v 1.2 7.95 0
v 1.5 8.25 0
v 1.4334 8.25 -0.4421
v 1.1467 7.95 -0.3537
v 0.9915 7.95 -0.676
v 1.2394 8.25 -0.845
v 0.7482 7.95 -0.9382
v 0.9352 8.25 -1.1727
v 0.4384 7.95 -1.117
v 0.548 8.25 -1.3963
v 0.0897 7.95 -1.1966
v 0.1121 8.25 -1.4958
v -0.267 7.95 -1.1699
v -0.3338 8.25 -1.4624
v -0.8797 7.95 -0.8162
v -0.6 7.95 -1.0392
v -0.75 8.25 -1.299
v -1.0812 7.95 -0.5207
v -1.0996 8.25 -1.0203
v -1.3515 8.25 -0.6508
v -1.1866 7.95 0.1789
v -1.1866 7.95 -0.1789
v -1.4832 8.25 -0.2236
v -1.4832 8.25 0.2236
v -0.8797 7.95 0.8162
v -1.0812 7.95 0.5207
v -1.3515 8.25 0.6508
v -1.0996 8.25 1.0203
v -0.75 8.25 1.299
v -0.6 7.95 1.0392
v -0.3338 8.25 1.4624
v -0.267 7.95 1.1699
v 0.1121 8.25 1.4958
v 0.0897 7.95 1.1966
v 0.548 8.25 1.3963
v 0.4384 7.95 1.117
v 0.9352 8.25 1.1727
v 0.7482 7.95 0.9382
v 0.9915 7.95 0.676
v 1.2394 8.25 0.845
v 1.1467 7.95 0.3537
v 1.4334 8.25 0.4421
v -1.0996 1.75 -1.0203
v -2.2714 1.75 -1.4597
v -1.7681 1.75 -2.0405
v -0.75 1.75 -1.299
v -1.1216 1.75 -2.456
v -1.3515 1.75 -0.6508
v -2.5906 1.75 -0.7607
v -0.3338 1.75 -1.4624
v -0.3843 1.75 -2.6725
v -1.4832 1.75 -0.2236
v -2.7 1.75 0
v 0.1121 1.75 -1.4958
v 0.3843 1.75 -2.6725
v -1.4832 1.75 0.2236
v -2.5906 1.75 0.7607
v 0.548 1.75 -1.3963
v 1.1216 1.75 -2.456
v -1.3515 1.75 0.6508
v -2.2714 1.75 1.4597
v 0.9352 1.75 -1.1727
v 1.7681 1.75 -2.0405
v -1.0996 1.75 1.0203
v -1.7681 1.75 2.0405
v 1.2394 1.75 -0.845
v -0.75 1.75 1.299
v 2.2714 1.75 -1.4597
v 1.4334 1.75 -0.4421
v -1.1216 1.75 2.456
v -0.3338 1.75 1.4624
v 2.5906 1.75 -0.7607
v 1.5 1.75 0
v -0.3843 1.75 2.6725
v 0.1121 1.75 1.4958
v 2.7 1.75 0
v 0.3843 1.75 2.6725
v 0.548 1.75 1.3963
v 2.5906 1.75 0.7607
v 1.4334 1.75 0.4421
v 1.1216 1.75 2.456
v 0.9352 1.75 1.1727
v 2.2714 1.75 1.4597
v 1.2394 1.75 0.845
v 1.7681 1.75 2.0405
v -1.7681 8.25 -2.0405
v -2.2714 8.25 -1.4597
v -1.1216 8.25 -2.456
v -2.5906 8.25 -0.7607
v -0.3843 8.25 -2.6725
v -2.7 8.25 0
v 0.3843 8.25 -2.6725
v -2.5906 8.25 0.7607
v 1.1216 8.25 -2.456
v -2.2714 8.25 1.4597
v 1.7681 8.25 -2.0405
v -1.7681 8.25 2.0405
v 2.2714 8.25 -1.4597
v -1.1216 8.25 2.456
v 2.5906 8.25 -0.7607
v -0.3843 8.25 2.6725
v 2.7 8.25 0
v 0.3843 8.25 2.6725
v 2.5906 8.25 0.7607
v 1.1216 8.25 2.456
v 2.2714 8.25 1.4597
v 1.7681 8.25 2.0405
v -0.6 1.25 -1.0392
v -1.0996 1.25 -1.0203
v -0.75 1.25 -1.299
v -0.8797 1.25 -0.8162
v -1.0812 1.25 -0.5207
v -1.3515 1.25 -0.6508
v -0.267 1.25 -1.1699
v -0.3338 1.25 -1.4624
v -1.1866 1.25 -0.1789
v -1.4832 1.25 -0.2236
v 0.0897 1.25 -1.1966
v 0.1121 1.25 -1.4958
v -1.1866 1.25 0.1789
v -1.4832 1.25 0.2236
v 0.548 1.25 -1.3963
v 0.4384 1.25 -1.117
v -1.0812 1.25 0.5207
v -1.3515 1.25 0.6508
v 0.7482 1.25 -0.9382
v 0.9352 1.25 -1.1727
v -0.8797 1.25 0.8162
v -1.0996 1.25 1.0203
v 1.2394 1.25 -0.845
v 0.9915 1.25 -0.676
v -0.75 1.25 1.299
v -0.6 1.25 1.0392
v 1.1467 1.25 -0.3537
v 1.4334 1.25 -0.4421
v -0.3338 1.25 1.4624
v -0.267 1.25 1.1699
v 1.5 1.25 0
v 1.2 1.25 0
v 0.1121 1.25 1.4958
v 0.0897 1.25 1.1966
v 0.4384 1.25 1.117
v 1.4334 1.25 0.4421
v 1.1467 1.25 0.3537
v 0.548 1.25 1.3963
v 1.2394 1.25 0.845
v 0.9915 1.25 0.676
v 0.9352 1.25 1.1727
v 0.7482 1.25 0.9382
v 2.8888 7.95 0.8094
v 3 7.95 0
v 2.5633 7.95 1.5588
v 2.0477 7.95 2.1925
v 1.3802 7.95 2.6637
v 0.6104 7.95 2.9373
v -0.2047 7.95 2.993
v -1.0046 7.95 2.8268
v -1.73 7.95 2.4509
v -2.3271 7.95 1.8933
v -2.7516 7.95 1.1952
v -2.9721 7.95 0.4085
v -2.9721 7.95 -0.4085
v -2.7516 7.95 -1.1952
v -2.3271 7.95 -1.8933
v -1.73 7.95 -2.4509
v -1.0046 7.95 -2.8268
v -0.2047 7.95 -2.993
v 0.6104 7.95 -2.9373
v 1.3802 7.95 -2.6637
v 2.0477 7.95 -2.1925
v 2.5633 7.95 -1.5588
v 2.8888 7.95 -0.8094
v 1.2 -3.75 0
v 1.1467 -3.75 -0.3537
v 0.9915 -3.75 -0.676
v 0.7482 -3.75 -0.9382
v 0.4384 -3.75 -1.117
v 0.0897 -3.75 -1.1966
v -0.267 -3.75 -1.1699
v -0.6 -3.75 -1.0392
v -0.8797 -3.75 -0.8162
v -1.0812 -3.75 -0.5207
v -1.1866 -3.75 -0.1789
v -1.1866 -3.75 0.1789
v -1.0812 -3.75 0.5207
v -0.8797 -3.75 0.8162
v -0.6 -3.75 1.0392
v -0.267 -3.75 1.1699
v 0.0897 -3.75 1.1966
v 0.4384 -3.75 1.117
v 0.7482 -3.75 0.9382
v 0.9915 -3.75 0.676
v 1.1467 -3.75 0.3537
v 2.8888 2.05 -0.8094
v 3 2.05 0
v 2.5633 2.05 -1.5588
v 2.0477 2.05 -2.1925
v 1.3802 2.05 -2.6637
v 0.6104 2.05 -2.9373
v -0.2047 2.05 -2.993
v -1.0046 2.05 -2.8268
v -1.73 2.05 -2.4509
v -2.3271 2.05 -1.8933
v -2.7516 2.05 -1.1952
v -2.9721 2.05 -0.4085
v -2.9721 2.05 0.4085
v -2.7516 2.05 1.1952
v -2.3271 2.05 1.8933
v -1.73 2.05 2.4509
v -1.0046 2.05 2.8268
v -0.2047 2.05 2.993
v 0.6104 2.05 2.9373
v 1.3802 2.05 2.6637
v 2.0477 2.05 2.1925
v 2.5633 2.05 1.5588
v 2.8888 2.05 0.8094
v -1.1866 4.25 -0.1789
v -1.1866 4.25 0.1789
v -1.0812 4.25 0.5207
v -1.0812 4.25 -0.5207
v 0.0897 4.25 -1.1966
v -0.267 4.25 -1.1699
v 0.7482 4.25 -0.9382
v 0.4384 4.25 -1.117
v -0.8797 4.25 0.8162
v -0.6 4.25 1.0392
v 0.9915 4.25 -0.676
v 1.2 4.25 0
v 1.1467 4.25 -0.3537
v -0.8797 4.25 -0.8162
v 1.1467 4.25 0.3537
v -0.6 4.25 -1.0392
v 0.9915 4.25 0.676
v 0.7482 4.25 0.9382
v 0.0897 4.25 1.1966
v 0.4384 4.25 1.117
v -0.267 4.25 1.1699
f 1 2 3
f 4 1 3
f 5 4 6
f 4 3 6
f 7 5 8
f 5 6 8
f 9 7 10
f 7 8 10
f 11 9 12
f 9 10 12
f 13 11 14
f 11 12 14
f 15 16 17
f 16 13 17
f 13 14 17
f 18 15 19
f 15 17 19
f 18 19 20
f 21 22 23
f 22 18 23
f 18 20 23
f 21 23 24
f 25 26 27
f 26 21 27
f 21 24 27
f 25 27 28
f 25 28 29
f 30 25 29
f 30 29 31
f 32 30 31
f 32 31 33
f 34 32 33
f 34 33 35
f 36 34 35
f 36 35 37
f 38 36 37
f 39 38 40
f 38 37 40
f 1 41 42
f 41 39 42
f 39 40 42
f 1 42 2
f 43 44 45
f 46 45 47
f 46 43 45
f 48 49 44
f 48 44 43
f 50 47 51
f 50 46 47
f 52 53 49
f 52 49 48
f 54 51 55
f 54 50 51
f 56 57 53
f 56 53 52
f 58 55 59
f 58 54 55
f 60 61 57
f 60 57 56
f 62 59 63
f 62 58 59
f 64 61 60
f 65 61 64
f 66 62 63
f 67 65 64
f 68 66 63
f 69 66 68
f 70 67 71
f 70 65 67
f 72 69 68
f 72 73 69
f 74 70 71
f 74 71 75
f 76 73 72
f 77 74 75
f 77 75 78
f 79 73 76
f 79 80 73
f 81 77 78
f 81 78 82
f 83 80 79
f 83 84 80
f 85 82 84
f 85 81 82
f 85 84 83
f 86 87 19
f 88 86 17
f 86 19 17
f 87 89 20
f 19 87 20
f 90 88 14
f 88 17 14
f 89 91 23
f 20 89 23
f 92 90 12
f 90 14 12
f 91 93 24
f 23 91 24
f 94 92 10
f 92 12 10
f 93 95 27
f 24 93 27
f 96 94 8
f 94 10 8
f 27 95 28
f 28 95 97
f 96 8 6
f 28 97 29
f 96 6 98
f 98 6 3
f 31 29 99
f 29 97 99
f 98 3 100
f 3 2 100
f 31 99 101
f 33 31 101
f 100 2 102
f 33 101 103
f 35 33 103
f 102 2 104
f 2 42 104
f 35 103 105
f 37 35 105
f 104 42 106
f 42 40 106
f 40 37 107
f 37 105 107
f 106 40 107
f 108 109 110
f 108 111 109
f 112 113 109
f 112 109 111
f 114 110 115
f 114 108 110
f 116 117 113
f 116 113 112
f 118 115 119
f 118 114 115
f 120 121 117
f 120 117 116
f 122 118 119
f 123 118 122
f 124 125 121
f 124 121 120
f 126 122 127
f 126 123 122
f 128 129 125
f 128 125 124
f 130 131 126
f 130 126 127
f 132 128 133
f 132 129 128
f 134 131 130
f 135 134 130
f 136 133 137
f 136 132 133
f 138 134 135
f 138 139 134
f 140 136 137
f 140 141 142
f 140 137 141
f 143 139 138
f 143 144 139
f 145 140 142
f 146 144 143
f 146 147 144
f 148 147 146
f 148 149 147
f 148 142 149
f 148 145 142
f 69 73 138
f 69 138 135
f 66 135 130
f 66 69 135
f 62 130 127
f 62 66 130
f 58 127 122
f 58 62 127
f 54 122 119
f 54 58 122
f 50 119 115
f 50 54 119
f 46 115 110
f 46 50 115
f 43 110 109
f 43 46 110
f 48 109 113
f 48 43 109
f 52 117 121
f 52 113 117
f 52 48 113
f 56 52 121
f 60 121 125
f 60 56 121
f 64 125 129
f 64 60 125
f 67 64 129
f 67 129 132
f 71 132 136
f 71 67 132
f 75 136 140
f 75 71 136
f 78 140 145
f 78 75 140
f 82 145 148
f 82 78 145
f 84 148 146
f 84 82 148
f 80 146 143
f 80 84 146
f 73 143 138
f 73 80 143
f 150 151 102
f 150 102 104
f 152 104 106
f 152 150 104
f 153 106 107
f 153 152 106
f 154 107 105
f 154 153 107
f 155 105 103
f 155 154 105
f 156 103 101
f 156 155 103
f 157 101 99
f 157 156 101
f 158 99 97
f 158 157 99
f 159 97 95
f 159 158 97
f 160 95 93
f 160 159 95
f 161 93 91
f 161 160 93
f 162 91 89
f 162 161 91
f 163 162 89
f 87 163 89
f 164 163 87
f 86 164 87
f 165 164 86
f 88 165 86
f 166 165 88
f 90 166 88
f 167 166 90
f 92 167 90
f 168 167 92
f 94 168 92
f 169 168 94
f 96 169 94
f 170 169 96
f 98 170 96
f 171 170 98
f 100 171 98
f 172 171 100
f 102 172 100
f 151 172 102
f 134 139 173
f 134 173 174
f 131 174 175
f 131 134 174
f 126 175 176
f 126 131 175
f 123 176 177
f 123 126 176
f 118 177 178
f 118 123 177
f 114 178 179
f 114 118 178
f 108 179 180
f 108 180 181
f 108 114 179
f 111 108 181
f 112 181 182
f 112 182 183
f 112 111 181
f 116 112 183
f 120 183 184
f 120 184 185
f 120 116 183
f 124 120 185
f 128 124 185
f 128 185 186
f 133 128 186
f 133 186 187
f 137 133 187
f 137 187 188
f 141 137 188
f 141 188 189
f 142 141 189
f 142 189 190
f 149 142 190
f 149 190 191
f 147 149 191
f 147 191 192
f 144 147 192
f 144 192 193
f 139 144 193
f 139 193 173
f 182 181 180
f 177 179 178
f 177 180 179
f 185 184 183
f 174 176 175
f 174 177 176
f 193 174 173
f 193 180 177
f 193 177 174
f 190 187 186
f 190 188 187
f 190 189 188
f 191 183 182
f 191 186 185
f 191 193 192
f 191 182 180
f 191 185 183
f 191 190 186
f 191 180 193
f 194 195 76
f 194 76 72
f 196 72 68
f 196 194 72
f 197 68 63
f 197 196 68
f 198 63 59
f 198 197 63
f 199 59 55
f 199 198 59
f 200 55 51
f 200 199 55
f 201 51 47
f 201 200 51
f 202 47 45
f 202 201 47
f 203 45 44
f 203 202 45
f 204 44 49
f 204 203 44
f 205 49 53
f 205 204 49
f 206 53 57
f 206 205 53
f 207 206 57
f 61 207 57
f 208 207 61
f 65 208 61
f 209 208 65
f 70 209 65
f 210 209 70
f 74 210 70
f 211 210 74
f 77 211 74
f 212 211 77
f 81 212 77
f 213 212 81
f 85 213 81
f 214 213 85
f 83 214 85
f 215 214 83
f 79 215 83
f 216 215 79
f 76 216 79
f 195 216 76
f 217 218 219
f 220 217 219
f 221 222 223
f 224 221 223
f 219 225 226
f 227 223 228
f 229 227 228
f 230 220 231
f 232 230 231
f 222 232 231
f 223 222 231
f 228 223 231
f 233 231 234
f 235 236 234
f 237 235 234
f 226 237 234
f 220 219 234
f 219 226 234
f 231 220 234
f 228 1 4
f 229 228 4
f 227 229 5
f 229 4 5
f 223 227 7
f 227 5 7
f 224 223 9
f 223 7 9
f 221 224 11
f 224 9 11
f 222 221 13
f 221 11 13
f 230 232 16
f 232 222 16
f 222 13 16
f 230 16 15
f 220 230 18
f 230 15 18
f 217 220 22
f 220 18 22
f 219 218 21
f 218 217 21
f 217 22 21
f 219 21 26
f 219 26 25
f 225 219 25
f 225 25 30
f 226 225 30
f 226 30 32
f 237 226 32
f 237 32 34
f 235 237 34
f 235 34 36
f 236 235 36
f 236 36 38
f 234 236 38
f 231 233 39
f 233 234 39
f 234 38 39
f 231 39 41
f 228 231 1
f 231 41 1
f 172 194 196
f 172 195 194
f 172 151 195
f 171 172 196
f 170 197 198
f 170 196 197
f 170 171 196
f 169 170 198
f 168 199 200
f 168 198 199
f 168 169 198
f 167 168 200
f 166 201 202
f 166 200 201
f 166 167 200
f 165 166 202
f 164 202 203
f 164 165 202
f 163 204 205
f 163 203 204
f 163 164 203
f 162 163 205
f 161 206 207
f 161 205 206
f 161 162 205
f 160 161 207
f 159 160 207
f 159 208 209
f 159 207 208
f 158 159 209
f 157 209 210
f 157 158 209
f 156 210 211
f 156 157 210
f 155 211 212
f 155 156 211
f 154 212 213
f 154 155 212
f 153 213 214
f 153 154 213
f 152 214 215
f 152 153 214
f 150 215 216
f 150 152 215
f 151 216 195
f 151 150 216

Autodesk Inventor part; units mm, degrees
ref_plane "YZ Plane" through (0, 0, 0) normal (1, 0, 0) x (0, 1, 0)
ref_plane "XZ Plane" through (0, 0, 0) normal (0, 1, 0) x (-1, 0, 0)
ref_plane "XY Plane" through (0, 0, 0) normal (0, 0, 1) x (1, 0, 0)
sketch "スケッチ1" plane through (0, 0, 0) normal (0, 0, 1) x (1, 0, 0)
  line L0 (0, -4.25) -> (0.9, -4.25)
  line L1 (0.9, -4.25) -> (1.2, -3.95)
  line L2 (1.2, -3.95) -> (1.2, 1.25)
  line L3 (1.2, 1.25) -> (1.5, 1.25)
  line L4 (1.5, 1.25) -> (1.5, 1.75)
  line L5 (1.5, 1.75) -> (2.7, 1.75)
  line L6 (3, 7.95) -> (2.7, 8.25)
  line L7 (2.7, 8.25) -> (1.5, 8.25)
  line L8 (1.5, 8.25) -> (1.2, 7.95)
  line L9 (0, 7.4044) -> (0, -7.4044) construction
  line L10 (0, -4.25) -> (0, 4.25)
  line L11 (0, 4.25) -> (1.2, 4.25)
  line L12 (1.2, 4.25) -> (1.2, 7.95)
  line L13 (2.7, 1.75) -> (3, 2.05)
  line L14 (3, 2.05) -> (3, 7.95)
  point P0 (0, 0)
  point P1 (0, 0)
  dimension "d0" = 2.4
  dimension "d1" = 6
  dimension "d2" = 0.3
  dimension "d3" = 0.3
  dimension "d4" = 3
  dimension "d5" = 0.5
  dimension "d6" = 6.5
  dimension "d8" = 0.3
  dimension "d9" = 2.4
  dimension "d10" = 4
  dimension "d11" = 0.3
  dimension "d12" = 0.3
  dimension "d13" = 0.3
  dimension "d14" = 0.3
  dimension "d15" = 6
revolve "回転1" add sketch "スケッチ1" angle 360 about axis through (0, 7.4044, 0) along (0, -1, 0)
sketch "スケッチ2" plane through (0, -4.25, 0) normal (0, -1, 0) x (1, 0, 0)
  circle A0 centre (0, 0) radius 0.9 projected
  circle A1 centre (0, 0) radius 9.0242
extrude "押し出し1" cut sketch "スケッチ2" against normal blind 0.5 contours A0 | A1
equation "\"d3\" = d2"
equation "\"d11\" = d8"
equation "\"d12\" = d8"
equation "\"d13\" = d12"
equation "\"d14\" = d13"
properties part number "BRU-306_5" material "ステンレス鋼 AISI 304"
